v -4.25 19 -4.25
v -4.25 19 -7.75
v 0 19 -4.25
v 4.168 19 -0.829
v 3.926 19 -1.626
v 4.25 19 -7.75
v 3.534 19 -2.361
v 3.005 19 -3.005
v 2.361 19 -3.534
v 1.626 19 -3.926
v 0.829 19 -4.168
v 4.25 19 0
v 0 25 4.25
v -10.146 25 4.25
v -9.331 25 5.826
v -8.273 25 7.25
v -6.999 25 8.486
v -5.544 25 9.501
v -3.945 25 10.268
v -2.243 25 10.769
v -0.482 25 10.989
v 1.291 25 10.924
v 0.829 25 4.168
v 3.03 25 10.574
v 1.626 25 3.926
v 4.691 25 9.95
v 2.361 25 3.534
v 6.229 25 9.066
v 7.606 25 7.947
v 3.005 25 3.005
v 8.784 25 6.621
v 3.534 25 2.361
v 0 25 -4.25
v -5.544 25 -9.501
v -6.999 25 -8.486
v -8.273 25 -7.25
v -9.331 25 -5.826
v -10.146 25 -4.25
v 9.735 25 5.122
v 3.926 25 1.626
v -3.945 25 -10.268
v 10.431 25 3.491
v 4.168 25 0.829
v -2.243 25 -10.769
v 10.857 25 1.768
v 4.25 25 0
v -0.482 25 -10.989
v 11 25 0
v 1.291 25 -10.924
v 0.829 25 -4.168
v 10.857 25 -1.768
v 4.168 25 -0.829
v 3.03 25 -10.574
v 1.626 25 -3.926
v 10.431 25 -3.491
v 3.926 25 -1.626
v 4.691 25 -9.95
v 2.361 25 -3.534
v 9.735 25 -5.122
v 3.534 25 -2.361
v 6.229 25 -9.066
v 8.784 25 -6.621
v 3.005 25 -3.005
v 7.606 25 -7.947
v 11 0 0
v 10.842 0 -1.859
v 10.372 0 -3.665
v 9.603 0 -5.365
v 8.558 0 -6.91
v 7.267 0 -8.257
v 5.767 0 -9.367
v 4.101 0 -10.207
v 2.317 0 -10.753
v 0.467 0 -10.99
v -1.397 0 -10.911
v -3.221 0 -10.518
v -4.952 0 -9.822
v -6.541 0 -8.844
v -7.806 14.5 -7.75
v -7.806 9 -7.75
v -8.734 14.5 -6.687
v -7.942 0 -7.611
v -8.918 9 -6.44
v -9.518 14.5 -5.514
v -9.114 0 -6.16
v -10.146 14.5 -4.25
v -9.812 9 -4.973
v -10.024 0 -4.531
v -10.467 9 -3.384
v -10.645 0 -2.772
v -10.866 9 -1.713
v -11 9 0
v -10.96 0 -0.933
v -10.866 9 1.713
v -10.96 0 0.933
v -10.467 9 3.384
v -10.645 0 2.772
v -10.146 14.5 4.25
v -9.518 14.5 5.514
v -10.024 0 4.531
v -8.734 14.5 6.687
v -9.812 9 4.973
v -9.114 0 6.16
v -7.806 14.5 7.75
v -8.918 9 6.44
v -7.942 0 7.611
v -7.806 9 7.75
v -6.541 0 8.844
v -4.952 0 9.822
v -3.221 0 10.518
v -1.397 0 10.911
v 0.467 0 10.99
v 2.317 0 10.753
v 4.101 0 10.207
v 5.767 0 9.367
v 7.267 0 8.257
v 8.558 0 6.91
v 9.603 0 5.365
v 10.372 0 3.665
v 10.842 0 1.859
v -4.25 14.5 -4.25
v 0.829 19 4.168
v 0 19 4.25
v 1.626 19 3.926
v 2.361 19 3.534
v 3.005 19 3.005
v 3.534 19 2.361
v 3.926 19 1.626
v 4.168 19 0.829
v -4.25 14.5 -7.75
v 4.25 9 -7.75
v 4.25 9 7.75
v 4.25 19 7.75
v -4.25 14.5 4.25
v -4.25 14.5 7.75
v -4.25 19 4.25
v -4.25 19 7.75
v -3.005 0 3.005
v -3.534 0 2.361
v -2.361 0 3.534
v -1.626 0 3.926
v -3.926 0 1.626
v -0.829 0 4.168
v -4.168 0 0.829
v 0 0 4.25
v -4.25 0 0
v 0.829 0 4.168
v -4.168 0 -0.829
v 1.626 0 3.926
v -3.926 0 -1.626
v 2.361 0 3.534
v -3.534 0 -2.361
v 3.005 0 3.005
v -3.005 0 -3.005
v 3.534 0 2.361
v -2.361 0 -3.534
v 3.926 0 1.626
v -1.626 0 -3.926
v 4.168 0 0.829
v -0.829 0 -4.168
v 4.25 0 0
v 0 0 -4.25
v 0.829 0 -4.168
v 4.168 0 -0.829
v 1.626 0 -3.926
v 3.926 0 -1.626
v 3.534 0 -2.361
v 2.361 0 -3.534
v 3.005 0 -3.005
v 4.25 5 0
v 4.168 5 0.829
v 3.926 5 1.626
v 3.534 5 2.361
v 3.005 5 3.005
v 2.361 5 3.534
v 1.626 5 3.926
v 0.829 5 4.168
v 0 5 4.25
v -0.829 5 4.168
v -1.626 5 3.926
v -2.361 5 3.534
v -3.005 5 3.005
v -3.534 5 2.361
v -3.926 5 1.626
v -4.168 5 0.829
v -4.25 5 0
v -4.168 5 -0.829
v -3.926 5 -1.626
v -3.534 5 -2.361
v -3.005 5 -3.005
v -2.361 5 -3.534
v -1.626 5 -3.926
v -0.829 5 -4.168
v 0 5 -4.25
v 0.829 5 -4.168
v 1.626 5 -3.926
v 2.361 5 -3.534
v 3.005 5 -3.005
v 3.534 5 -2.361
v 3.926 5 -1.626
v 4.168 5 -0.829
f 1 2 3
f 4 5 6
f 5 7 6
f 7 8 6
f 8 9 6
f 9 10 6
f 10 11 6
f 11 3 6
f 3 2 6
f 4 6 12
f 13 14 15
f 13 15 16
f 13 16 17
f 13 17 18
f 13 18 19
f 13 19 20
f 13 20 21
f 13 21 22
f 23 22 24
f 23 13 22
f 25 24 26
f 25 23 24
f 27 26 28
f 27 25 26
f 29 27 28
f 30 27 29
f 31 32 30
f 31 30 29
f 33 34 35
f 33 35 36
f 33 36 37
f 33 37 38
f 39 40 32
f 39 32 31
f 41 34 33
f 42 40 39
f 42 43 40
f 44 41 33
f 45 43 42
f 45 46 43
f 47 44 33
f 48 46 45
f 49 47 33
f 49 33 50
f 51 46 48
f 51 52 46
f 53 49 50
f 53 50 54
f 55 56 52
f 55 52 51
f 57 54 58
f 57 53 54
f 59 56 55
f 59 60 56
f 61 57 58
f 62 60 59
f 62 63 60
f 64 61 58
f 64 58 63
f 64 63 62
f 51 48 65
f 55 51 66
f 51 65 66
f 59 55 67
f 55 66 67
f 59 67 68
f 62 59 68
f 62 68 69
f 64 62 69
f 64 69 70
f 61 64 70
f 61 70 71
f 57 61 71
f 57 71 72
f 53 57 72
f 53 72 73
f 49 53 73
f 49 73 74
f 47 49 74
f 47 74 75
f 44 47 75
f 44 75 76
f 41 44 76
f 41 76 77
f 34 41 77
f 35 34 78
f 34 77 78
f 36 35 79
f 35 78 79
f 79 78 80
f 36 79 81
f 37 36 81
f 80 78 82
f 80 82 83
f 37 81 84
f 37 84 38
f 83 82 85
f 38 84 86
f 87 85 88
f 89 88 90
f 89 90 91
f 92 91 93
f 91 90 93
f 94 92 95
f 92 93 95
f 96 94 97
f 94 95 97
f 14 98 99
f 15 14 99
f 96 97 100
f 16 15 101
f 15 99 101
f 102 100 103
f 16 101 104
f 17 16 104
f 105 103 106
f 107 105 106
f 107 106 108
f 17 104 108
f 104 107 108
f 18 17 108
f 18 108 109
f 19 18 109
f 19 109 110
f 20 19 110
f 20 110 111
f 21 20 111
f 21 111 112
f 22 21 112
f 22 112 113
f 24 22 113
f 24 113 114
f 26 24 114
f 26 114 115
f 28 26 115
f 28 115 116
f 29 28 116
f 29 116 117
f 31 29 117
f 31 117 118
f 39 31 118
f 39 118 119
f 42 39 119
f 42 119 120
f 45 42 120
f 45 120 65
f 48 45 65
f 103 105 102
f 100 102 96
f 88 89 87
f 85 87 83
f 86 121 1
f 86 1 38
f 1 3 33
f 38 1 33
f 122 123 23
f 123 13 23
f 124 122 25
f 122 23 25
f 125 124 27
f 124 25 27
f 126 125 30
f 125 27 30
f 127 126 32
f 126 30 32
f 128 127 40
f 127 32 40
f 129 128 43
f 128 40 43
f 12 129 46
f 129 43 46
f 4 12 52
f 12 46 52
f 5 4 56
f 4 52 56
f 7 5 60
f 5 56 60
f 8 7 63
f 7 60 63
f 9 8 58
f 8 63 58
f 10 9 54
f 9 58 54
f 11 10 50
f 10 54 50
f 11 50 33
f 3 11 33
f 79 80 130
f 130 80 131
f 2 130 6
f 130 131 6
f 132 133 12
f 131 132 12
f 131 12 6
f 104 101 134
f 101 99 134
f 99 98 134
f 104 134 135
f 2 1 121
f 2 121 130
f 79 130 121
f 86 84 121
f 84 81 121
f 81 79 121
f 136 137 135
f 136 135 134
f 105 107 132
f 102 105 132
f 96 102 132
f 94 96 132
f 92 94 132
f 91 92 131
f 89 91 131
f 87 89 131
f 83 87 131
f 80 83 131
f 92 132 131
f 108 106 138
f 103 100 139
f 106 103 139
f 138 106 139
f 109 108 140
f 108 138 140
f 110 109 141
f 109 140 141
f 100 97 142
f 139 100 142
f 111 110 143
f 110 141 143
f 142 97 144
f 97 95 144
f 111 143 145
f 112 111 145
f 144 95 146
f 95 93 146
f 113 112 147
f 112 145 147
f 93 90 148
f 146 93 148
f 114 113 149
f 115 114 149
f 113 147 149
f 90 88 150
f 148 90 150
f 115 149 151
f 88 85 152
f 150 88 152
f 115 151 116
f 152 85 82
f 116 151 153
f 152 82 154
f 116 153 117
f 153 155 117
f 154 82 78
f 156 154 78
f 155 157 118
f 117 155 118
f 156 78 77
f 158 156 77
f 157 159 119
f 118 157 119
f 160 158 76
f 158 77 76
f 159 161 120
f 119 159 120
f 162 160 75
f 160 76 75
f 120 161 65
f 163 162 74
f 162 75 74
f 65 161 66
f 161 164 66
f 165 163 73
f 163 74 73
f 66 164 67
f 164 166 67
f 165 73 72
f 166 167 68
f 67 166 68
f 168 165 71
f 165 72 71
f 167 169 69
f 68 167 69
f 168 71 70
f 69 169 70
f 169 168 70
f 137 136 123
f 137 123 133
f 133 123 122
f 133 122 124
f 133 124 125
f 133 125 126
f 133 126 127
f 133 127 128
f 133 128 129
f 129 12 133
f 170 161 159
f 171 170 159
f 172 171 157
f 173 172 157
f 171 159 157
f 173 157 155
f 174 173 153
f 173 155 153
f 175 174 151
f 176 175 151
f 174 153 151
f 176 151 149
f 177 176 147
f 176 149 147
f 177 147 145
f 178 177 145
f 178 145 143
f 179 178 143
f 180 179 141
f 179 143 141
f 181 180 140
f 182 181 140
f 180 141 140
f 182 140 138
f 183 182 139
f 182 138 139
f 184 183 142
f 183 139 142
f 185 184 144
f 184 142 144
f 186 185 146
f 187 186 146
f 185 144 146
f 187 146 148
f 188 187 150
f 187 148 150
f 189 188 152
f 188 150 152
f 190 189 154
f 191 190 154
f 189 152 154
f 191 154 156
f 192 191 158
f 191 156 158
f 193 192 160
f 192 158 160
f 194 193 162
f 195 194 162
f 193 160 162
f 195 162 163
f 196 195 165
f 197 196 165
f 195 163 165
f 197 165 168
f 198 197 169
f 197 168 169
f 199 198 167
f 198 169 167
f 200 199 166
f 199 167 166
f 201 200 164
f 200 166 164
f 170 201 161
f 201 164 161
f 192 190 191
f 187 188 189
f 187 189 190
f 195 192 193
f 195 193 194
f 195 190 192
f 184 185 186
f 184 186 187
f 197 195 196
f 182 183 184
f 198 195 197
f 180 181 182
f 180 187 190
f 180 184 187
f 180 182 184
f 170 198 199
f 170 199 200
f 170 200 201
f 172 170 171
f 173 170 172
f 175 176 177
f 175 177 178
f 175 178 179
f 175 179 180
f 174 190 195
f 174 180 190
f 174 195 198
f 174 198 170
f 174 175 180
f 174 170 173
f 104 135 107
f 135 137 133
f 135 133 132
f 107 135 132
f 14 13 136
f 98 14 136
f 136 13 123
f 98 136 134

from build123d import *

# Parameters (mm, degrees)
CROQUIS1_R              = 11
SALIENTE_EXTRUIR1_DEPTH = 25
CROQUIS2_R              = 4.25
CORTAR_EXTRUIR1_DEPTH   = 5
CROQUIS3_R              = 4.25
CORTAR_EXTRUIR2_DEPTH   = 6
CROQUIS5_W              = 8.5
CROQUIS5_H              = 15.5
CORTAR_EXTRUIR8_DEPTH   = 10
CORTAR_EXTRUIR16_DEPTH  = 12


with BuildPart() as part:
    # Croquis1 → Saliente-Extruir1 (new body)
    with BuildSketch(Plane(origin=(0, 0, 0), x_dir=(1, 0, 0), z_dir=(0, 1, 0))):
        Circle(CROQUIS1_R)
    extrude(amount=SALIENTE_EXTRUIR1_DEPTH)

    # Croquis2 → Cortar-Extruir1 (cut)
    with BuildSketch(Plane.XZ):
        Circle(CROQUIS2_R)
    extrude(amount=-CORTAR_EXTRUIR1_DEPTH, mode=Mode.SUBTRACT)

    # Croquis3 → Cortar-Extruir2 (cut)
    with BuildSketch(Plane(origin=(0, 25, 0), x_dir=(1, 0, 0), z_dir=(0, 1, 0))):
        Circle(CROQUIS3_R)
    extrude(amount=-CORTAR_EXTRUIR2_DEPTH, mode=Mode.SUBTRACT)

    # Croquis5 → Cortar-Extruir8 (cut)
    with BuildSketch(Plane(origin=(0, 19, 0), x_dir=(1, 0, 0), z_dir=(0, 1, 0))):
        Rectangle(CROQUIS5_W, CROQUIS5_H)
    extrude(amount=-CORTAR_EXTRUIR8_DEPTH, mode=Mode.SUBTRACT)

    # Croquis9 → Cortar-Extruir16 (cut, through all)
    with BuildSketch(Plane(origin=(0, 0, 0), x_dir=(0, 0, -1), z_dir=(1, 0, 0))):
        Polygon((-7.75, 9), (7.75, 9), (7.75, 14.5), (4.25, 14.5), (4.25, 25.5), (-4.25, 25.5), (-4.25, 14.5), (-7.75, 14.5), align=None)
    extrude(amount=-CORTAR_EXTRUIR16_DEPTH, mode=Mode.SUBTRACT)


solid = part.part
